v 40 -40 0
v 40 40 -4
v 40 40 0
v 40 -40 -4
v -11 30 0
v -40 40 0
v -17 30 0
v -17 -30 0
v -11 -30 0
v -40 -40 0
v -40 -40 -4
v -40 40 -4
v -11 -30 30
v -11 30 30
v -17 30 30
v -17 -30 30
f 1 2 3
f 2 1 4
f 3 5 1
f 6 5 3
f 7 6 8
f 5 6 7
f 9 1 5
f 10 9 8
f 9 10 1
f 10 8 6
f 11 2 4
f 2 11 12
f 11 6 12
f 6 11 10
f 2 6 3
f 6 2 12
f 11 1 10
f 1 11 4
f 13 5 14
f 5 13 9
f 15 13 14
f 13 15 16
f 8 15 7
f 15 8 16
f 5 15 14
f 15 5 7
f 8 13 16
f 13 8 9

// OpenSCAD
// Self-shadowing: a tall wall standing on a flat plate, so the wall throws a
// shadow across the plate.
//
// Both lights are eye-space directional and parented to the camera - light 0
// arrives from up-left-toward-the-viewer - so the geometry is arranged for that
// rig rather than for a world-fixed sun. There is deliberately no ground plane:
// the shadow receiver is part of the model, which is the whole scope of this
// feature. A user who wants a shadow on the floor adds a floor.
color([.8, .8, .8]) {
  translate([0, 0, -2]) cube([80, 80, 4], center = true);
  translate([-14, 0, 15]) cube([6, 60, 30], center = true);
}
